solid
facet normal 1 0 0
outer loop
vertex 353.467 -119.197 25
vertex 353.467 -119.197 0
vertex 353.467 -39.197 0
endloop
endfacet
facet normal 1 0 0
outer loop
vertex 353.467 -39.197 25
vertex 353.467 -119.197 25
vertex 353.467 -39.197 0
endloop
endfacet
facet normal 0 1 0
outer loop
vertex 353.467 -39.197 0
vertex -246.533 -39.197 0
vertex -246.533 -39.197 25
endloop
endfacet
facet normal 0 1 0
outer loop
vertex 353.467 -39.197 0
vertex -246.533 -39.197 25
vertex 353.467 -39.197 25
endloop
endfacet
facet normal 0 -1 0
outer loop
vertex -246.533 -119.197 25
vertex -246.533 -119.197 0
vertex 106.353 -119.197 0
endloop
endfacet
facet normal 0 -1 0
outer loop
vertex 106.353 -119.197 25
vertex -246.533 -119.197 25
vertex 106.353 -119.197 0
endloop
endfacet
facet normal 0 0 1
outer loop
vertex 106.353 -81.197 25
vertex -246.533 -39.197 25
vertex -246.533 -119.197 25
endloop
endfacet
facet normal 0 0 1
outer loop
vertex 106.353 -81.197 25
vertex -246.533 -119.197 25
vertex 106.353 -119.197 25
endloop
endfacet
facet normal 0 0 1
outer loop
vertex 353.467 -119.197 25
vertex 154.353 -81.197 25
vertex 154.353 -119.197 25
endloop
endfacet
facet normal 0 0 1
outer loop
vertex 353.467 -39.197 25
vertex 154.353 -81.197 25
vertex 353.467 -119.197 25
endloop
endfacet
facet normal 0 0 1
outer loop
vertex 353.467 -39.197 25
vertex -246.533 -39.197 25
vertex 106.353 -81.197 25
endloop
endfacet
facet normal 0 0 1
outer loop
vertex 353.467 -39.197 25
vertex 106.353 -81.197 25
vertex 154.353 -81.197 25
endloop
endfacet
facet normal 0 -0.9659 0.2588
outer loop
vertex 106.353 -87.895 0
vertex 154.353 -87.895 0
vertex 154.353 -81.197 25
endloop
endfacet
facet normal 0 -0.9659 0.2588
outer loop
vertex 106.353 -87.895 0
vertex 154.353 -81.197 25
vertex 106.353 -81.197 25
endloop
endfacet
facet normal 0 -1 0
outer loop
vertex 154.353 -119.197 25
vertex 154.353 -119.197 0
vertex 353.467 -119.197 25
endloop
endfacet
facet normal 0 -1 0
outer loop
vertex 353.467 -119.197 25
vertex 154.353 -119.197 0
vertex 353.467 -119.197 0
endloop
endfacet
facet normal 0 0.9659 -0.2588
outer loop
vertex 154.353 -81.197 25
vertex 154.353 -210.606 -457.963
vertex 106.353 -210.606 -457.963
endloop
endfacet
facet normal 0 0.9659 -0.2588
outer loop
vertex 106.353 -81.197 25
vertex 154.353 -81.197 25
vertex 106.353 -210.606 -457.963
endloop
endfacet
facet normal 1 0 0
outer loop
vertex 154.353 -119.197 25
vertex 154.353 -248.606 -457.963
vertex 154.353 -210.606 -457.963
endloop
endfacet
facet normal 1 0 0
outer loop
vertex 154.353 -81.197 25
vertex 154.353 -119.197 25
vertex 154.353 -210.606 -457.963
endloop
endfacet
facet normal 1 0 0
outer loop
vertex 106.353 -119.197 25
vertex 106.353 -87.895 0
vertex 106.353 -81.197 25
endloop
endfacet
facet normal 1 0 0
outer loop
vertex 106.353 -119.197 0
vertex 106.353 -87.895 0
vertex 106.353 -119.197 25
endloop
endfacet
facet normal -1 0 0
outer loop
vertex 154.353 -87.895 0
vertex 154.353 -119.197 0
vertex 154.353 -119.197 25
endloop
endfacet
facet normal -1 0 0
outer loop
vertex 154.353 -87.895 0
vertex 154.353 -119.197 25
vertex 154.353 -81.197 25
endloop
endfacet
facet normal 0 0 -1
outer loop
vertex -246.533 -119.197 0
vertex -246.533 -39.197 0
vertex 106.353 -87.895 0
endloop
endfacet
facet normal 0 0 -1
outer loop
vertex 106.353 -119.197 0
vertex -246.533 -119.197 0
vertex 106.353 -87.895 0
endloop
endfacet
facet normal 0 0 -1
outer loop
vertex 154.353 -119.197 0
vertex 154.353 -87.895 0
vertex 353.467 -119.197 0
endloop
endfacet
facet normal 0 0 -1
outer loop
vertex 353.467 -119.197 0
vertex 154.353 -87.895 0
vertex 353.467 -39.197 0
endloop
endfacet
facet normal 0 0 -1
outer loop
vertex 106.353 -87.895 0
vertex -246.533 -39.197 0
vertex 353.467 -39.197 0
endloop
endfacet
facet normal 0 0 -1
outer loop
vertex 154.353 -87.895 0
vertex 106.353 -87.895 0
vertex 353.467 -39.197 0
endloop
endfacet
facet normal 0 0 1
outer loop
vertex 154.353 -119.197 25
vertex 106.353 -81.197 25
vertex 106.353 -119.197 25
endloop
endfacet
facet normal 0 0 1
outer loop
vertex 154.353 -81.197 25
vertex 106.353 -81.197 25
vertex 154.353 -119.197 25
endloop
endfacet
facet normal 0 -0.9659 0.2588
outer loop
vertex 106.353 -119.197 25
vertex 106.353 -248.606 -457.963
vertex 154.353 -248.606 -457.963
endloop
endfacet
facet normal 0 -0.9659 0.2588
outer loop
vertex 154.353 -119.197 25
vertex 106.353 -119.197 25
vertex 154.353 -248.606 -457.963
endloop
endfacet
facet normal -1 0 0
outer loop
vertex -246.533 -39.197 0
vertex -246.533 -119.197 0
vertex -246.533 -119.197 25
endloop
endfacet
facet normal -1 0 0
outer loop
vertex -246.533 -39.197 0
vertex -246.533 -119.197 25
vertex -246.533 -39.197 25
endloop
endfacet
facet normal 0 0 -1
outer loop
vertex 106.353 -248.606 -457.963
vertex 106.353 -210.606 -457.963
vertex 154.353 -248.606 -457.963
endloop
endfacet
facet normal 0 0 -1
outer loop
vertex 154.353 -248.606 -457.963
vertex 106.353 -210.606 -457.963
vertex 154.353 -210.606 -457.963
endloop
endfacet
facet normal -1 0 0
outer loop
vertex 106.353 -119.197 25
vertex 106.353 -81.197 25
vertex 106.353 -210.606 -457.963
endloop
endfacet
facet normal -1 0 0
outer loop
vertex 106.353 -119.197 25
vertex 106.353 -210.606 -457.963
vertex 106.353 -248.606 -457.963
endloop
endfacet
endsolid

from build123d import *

# Parameters (mm, degrees)
F0_W     = 600
F0_H     = 80
F1_DEPTH = 25
F2_W     = 48
F2_H     = 38


with BuildPart() as f1:
    # F0 (on Top) → F1 (new body)
    with BuildSketch(Plane.XY):
        with Locations((53.466596, -79.196742)):
            Rectangle(F0_W, F0_H)
    extrude(amount=F1_DEPTH)


with BuildPart() as f4:
    # F4: sweep along a path in F6
    with BuildLine(Plane.YZ.offset(106.352791)) as f4_path:
        Line((-119.196742, 25), (-248.606265, -457.962913))
    # F2 (on face) → F4 (sweep)
    with BuildSketch(Plane.XY.offset(25)):
        with Locations((130.352791, -100.196742)):
            Rectangle(F2_W, F2_H)
    sweep(path=f4_path.line)


with BuildPart() as f1_1:
    add(f1.part)

    # F5: cut F4
    add(f4.part, mode=Mode.SUBTRACT)


solid = Compound([f4.part, f1_1.part])
